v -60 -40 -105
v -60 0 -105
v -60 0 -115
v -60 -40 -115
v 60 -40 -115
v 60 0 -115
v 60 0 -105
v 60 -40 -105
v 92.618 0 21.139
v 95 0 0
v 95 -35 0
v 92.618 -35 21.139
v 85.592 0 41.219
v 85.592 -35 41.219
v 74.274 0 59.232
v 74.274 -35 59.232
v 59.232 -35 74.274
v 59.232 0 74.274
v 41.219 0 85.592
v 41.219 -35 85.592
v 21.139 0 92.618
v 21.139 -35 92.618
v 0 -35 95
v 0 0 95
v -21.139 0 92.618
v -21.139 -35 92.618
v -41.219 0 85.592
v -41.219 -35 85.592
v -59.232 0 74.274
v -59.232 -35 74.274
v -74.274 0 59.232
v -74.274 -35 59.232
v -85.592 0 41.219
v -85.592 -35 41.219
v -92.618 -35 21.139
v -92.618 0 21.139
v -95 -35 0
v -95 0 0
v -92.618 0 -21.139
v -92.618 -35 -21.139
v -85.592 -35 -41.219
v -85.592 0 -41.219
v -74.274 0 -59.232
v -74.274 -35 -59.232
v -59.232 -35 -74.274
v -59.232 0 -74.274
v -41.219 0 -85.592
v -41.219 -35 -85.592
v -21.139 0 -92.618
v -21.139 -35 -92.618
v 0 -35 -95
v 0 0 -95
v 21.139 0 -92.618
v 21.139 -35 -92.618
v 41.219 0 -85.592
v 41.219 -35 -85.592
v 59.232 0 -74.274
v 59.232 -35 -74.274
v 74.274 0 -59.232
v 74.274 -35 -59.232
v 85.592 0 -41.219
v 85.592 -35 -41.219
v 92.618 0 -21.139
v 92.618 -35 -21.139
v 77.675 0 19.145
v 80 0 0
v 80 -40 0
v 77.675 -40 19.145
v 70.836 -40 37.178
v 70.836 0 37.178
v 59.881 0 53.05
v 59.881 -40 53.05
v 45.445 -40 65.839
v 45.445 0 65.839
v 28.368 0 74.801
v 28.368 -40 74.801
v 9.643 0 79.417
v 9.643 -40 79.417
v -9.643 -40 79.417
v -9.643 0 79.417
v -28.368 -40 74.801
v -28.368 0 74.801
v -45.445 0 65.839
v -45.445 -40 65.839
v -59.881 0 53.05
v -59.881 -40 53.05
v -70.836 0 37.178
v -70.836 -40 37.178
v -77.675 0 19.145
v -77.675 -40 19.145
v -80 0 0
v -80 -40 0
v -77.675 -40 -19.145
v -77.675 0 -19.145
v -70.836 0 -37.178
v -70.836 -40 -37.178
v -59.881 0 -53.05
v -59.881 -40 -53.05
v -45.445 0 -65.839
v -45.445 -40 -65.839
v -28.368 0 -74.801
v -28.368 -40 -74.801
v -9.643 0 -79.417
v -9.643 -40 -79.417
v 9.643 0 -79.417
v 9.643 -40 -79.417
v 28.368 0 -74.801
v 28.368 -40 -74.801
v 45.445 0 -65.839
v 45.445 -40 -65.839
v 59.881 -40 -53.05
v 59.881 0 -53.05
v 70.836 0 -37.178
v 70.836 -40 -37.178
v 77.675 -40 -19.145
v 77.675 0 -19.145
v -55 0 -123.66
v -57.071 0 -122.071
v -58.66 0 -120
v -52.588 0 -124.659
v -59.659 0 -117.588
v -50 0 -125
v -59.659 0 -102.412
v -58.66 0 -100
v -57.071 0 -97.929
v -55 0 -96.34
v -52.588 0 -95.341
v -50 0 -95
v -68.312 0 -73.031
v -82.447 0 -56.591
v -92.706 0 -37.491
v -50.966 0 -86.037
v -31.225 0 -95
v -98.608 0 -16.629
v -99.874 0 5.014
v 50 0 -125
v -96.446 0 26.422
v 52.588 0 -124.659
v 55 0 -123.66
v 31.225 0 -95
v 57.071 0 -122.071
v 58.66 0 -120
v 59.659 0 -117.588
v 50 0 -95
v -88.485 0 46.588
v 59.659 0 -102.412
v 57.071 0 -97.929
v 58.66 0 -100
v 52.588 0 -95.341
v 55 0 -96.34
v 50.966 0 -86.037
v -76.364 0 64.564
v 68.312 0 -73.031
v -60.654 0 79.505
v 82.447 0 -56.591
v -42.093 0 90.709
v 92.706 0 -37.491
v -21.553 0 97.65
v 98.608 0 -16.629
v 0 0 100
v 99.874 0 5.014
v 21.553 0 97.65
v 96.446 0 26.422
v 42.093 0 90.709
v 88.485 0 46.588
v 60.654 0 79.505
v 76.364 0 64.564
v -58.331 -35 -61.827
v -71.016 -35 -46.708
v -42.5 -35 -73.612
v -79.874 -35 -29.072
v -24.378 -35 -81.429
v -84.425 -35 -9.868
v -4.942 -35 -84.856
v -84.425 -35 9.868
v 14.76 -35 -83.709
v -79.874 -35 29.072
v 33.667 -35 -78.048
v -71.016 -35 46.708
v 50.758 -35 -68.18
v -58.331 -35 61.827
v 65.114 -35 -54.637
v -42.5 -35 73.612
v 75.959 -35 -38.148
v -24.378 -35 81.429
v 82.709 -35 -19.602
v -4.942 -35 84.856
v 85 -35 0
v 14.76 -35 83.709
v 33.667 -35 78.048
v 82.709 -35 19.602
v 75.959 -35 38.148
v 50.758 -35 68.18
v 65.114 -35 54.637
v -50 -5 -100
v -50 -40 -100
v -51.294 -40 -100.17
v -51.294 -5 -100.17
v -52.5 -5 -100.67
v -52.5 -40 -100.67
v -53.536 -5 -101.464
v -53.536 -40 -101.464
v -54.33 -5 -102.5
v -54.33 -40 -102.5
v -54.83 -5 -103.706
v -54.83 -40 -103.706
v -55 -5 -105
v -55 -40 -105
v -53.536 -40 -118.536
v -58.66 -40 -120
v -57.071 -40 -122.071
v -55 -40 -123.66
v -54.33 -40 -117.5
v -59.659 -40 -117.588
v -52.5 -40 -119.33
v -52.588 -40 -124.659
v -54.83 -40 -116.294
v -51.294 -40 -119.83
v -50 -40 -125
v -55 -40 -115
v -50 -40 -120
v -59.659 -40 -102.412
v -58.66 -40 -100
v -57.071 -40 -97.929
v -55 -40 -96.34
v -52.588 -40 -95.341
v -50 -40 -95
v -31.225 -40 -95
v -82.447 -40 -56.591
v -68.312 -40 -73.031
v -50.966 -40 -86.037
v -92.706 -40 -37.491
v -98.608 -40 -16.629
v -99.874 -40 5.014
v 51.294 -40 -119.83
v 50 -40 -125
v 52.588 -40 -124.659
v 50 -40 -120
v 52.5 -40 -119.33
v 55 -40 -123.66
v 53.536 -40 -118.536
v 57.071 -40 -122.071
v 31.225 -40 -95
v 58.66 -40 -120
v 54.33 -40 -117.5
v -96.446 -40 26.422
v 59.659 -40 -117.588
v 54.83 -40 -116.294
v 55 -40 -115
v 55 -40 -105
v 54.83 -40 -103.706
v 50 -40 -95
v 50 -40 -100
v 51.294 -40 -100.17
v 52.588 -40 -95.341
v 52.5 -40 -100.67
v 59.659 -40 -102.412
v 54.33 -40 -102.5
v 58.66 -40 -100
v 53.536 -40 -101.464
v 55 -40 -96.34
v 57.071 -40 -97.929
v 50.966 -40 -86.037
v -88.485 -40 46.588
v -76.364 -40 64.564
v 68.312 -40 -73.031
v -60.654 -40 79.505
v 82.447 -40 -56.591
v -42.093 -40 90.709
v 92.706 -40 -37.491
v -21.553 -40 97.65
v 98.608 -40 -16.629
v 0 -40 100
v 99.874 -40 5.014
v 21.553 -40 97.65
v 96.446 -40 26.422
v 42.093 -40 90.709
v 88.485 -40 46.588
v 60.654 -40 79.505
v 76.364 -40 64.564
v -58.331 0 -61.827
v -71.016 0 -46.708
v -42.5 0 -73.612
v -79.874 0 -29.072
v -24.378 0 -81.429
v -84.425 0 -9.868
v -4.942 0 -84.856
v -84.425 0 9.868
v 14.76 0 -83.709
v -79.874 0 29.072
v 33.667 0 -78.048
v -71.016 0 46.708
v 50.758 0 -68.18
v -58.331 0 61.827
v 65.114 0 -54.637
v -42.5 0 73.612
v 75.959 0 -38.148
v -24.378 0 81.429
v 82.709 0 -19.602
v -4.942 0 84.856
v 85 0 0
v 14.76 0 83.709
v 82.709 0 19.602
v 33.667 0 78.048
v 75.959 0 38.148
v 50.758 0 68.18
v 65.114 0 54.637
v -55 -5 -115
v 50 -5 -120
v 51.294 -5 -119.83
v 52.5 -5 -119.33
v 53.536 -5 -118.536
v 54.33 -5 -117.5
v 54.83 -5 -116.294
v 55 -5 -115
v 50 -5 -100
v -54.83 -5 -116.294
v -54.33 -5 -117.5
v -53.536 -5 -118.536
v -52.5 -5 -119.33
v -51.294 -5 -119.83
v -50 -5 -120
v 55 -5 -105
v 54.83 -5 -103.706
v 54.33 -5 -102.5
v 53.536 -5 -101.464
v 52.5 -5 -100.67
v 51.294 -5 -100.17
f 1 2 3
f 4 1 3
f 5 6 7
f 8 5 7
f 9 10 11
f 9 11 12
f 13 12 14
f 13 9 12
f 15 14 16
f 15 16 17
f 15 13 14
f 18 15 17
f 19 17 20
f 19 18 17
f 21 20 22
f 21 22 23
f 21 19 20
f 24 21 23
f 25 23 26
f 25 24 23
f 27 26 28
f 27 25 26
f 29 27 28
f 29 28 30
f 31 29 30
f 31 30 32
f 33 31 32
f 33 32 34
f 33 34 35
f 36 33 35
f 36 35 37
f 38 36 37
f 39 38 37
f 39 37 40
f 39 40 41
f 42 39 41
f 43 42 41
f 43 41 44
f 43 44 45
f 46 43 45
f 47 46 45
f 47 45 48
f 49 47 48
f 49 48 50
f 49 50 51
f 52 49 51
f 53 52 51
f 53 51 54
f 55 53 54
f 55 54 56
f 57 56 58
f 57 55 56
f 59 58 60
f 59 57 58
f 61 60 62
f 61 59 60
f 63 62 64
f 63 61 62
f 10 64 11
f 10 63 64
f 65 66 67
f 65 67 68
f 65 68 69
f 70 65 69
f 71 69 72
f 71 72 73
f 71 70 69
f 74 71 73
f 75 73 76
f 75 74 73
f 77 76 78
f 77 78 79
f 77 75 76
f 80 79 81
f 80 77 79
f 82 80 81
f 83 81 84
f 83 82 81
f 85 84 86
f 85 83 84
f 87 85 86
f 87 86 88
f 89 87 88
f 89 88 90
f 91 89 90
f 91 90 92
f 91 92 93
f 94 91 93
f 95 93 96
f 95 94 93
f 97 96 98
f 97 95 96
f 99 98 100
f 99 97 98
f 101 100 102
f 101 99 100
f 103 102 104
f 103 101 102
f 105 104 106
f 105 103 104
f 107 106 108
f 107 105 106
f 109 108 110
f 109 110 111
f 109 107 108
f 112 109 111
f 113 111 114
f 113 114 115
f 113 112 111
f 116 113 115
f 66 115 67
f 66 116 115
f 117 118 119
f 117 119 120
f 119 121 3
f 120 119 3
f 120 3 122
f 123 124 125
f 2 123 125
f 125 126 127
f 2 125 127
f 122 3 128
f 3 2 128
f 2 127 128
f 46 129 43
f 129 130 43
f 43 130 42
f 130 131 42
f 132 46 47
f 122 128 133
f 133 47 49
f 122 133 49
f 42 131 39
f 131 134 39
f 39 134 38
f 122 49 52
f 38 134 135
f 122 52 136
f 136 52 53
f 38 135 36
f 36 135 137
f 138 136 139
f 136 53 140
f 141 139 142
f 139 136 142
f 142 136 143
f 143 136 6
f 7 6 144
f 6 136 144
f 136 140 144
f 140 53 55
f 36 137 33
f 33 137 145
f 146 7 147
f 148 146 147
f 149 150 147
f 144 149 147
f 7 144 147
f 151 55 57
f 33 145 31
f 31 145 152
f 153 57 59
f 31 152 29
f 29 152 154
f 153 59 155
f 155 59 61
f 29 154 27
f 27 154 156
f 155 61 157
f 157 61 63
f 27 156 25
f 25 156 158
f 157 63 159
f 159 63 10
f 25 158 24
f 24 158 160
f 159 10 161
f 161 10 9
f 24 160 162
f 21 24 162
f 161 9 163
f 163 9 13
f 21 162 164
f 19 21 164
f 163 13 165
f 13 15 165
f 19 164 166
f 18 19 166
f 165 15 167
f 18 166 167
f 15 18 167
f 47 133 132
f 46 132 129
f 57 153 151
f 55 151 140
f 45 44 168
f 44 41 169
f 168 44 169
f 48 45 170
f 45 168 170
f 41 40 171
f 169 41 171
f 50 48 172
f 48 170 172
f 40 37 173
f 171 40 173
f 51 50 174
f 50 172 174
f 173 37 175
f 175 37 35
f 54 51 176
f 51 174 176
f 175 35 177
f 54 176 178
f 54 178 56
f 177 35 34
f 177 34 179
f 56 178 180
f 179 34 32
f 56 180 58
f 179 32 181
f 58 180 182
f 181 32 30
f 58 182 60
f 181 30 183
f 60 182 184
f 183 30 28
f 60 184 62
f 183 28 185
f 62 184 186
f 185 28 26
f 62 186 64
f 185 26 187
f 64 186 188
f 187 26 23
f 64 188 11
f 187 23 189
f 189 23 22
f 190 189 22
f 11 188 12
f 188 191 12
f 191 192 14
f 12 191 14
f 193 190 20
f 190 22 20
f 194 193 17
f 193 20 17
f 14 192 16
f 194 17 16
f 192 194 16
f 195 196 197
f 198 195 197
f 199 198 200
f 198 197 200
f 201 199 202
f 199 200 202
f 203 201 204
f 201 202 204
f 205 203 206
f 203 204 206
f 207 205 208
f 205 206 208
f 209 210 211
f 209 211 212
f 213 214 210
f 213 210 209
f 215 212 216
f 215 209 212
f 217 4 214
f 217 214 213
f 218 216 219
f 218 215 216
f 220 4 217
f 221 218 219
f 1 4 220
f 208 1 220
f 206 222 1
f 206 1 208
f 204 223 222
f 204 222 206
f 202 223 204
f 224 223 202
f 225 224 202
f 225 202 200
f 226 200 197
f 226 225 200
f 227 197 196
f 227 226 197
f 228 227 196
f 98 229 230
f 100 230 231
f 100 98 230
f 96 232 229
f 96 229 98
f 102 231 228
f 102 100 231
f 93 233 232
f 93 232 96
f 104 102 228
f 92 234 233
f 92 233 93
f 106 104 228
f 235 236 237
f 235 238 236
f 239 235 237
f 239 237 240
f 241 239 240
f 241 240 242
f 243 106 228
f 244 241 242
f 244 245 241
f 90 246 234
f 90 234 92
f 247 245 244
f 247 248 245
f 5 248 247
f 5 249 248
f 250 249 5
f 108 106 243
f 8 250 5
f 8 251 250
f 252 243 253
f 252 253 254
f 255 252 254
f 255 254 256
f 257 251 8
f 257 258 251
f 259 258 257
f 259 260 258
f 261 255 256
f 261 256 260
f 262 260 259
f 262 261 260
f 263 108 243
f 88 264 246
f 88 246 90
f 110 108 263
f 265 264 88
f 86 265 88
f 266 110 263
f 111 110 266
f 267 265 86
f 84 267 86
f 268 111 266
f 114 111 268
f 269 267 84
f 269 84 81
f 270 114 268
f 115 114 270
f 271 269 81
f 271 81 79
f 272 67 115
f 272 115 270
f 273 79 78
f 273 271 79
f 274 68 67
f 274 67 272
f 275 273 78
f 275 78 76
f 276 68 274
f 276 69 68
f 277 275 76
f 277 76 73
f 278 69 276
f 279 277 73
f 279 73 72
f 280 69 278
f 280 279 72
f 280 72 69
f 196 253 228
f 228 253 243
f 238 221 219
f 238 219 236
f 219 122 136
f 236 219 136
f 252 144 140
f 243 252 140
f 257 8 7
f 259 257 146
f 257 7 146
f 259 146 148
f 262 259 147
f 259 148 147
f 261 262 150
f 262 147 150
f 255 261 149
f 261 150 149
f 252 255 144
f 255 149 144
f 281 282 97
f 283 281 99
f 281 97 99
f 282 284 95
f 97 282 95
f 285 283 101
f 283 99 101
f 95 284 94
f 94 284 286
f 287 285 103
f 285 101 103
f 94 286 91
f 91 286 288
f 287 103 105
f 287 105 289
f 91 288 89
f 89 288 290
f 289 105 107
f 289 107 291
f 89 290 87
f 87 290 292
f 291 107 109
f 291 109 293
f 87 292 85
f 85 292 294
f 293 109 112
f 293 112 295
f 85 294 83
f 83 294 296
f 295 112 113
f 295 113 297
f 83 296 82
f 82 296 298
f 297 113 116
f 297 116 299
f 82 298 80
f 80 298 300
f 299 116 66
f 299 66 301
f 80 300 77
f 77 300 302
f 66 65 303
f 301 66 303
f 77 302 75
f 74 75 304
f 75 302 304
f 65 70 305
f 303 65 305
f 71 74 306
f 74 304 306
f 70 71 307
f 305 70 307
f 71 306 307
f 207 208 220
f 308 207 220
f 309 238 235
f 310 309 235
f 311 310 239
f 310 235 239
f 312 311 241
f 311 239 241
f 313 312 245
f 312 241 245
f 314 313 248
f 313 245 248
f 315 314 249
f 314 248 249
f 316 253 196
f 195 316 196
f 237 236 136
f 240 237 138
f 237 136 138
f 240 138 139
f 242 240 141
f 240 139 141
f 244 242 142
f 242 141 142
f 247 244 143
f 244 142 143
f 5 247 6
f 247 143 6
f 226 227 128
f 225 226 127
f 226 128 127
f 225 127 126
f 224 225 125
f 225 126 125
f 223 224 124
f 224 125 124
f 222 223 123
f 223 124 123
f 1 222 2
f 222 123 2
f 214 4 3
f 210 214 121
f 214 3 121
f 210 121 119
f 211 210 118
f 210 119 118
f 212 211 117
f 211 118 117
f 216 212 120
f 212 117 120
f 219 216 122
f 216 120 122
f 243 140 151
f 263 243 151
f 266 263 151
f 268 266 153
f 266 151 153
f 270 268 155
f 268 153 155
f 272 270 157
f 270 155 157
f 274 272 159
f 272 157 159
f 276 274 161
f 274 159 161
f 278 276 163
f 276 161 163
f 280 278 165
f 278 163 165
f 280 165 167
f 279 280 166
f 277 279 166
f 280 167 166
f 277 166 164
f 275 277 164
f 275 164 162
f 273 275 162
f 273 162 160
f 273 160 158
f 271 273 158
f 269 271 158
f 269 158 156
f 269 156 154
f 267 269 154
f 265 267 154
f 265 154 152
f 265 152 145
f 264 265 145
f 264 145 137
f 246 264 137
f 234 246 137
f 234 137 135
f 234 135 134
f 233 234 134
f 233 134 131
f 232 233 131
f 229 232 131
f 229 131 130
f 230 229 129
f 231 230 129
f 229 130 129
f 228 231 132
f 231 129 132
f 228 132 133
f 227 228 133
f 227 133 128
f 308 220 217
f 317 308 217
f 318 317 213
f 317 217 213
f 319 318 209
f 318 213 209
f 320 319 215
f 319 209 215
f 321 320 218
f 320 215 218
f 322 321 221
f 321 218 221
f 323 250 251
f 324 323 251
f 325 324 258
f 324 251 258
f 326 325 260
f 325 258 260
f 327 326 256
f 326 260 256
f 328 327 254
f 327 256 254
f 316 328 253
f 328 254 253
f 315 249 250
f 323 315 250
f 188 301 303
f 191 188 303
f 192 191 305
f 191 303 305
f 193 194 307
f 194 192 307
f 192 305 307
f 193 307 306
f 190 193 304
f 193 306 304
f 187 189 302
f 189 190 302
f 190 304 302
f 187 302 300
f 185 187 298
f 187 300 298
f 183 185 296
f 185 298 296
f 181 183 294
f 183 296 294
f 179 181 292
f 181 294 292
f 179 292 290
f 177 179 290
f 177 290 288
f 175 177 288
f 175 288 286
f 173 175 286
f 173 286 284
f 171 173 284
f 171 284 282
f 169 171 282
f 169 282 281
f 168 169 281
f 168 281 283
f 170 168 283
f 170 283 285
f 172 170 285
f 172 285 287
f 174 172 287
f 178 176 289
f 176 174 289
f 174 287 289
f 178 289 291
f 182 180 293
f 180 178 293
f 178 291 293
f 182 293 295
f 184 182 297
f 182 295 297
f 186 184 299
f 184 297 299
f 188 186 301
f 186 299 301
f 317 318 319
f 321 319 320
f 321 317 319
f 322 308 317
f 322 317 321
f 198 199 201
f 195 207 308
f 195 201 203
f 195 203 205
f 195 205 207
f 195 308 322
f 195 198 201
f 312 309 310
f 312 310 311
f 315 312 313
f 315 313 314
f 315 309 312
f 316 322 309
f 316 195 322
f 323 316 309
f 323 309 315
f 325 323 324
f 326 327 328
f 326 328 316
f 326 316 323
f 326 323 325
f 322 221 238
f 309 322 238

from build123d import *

# Parameters (mm, degrees)
SKETCH_R     = 100
SKETCH_R_2   = 80
PAD_DEPTH    = 40
THICKNESS_T  = -5
PAD001_DEPTH = 40
POCKET_DEPTH = 35


with BuildPart() as part:
    # Sketch → Pad (new body)
    with BuildSketch(Plane.XZ):
        Circle(SKETCH_R)
        Circle(SKETCH_R_2, mode=Mode.SUBTRACT)
    extrude(amount=PAD_DEPTH)

    # Thickness
    thickness_openings = [part.faces().sort_by_distance(p)[0] for p in [
        (-97.171573, 0, 0),
    ]]
    offset(amount=THICKNESS_T, openings=thickness_openings)

    # Sketch001 → Pad001 (join)
    with BuildSketch(Plane.XZ):
        with BuildLine():
            Line((-60, -105), (-60, -115))
            ThreePointArc((-60, -115), (-57.071068, -122.071068), (-50, -125))
            Line((-50, -125), (50, -125))
            ThreePointArc((50, -125), (57.071068, -122.071068), (60, -115))
            Line((60, -115), (60, -105))
            ThreePointArc((60, -105), (57.071068, -97.928932), (50, -95))
            Line((50, -95), (-50, -95))
            ThreePointArc((-50, -95), (-57.071068, -97.928932), (-60, -105))
        make_face()
    extrude(amount=PAD001_DEPTH)

    # Sketch002 (on Face11 of Pad001) → Pocket (cut)
    with BuildSketch(Plane.XZ.offset(40)):
        with BuildLine():
            Line((-55, -105), (-55, -115))
            ThreePointArc((-55, -115), (-53.535534, -118.535534), (-50, -120))
            Line((-50, -120), (50, -120))
            ThreePointArc((50, -120), (53.535534, -118.535534), (55, -115))
            Line((55, -115), (55, -105))
            ThreePointArc((55, -105), (53.535534, -101.464466), (50, -100))
            Line((50, -100), (-50, -100))
            ThreePointArc((-50, -100), (-53.535534, -101.464466), (-55, -105))
        make_face()
    extrude(amount=-POCKET_DEPTH, mode=Mode.SUBTRACT)


solid = part.part
